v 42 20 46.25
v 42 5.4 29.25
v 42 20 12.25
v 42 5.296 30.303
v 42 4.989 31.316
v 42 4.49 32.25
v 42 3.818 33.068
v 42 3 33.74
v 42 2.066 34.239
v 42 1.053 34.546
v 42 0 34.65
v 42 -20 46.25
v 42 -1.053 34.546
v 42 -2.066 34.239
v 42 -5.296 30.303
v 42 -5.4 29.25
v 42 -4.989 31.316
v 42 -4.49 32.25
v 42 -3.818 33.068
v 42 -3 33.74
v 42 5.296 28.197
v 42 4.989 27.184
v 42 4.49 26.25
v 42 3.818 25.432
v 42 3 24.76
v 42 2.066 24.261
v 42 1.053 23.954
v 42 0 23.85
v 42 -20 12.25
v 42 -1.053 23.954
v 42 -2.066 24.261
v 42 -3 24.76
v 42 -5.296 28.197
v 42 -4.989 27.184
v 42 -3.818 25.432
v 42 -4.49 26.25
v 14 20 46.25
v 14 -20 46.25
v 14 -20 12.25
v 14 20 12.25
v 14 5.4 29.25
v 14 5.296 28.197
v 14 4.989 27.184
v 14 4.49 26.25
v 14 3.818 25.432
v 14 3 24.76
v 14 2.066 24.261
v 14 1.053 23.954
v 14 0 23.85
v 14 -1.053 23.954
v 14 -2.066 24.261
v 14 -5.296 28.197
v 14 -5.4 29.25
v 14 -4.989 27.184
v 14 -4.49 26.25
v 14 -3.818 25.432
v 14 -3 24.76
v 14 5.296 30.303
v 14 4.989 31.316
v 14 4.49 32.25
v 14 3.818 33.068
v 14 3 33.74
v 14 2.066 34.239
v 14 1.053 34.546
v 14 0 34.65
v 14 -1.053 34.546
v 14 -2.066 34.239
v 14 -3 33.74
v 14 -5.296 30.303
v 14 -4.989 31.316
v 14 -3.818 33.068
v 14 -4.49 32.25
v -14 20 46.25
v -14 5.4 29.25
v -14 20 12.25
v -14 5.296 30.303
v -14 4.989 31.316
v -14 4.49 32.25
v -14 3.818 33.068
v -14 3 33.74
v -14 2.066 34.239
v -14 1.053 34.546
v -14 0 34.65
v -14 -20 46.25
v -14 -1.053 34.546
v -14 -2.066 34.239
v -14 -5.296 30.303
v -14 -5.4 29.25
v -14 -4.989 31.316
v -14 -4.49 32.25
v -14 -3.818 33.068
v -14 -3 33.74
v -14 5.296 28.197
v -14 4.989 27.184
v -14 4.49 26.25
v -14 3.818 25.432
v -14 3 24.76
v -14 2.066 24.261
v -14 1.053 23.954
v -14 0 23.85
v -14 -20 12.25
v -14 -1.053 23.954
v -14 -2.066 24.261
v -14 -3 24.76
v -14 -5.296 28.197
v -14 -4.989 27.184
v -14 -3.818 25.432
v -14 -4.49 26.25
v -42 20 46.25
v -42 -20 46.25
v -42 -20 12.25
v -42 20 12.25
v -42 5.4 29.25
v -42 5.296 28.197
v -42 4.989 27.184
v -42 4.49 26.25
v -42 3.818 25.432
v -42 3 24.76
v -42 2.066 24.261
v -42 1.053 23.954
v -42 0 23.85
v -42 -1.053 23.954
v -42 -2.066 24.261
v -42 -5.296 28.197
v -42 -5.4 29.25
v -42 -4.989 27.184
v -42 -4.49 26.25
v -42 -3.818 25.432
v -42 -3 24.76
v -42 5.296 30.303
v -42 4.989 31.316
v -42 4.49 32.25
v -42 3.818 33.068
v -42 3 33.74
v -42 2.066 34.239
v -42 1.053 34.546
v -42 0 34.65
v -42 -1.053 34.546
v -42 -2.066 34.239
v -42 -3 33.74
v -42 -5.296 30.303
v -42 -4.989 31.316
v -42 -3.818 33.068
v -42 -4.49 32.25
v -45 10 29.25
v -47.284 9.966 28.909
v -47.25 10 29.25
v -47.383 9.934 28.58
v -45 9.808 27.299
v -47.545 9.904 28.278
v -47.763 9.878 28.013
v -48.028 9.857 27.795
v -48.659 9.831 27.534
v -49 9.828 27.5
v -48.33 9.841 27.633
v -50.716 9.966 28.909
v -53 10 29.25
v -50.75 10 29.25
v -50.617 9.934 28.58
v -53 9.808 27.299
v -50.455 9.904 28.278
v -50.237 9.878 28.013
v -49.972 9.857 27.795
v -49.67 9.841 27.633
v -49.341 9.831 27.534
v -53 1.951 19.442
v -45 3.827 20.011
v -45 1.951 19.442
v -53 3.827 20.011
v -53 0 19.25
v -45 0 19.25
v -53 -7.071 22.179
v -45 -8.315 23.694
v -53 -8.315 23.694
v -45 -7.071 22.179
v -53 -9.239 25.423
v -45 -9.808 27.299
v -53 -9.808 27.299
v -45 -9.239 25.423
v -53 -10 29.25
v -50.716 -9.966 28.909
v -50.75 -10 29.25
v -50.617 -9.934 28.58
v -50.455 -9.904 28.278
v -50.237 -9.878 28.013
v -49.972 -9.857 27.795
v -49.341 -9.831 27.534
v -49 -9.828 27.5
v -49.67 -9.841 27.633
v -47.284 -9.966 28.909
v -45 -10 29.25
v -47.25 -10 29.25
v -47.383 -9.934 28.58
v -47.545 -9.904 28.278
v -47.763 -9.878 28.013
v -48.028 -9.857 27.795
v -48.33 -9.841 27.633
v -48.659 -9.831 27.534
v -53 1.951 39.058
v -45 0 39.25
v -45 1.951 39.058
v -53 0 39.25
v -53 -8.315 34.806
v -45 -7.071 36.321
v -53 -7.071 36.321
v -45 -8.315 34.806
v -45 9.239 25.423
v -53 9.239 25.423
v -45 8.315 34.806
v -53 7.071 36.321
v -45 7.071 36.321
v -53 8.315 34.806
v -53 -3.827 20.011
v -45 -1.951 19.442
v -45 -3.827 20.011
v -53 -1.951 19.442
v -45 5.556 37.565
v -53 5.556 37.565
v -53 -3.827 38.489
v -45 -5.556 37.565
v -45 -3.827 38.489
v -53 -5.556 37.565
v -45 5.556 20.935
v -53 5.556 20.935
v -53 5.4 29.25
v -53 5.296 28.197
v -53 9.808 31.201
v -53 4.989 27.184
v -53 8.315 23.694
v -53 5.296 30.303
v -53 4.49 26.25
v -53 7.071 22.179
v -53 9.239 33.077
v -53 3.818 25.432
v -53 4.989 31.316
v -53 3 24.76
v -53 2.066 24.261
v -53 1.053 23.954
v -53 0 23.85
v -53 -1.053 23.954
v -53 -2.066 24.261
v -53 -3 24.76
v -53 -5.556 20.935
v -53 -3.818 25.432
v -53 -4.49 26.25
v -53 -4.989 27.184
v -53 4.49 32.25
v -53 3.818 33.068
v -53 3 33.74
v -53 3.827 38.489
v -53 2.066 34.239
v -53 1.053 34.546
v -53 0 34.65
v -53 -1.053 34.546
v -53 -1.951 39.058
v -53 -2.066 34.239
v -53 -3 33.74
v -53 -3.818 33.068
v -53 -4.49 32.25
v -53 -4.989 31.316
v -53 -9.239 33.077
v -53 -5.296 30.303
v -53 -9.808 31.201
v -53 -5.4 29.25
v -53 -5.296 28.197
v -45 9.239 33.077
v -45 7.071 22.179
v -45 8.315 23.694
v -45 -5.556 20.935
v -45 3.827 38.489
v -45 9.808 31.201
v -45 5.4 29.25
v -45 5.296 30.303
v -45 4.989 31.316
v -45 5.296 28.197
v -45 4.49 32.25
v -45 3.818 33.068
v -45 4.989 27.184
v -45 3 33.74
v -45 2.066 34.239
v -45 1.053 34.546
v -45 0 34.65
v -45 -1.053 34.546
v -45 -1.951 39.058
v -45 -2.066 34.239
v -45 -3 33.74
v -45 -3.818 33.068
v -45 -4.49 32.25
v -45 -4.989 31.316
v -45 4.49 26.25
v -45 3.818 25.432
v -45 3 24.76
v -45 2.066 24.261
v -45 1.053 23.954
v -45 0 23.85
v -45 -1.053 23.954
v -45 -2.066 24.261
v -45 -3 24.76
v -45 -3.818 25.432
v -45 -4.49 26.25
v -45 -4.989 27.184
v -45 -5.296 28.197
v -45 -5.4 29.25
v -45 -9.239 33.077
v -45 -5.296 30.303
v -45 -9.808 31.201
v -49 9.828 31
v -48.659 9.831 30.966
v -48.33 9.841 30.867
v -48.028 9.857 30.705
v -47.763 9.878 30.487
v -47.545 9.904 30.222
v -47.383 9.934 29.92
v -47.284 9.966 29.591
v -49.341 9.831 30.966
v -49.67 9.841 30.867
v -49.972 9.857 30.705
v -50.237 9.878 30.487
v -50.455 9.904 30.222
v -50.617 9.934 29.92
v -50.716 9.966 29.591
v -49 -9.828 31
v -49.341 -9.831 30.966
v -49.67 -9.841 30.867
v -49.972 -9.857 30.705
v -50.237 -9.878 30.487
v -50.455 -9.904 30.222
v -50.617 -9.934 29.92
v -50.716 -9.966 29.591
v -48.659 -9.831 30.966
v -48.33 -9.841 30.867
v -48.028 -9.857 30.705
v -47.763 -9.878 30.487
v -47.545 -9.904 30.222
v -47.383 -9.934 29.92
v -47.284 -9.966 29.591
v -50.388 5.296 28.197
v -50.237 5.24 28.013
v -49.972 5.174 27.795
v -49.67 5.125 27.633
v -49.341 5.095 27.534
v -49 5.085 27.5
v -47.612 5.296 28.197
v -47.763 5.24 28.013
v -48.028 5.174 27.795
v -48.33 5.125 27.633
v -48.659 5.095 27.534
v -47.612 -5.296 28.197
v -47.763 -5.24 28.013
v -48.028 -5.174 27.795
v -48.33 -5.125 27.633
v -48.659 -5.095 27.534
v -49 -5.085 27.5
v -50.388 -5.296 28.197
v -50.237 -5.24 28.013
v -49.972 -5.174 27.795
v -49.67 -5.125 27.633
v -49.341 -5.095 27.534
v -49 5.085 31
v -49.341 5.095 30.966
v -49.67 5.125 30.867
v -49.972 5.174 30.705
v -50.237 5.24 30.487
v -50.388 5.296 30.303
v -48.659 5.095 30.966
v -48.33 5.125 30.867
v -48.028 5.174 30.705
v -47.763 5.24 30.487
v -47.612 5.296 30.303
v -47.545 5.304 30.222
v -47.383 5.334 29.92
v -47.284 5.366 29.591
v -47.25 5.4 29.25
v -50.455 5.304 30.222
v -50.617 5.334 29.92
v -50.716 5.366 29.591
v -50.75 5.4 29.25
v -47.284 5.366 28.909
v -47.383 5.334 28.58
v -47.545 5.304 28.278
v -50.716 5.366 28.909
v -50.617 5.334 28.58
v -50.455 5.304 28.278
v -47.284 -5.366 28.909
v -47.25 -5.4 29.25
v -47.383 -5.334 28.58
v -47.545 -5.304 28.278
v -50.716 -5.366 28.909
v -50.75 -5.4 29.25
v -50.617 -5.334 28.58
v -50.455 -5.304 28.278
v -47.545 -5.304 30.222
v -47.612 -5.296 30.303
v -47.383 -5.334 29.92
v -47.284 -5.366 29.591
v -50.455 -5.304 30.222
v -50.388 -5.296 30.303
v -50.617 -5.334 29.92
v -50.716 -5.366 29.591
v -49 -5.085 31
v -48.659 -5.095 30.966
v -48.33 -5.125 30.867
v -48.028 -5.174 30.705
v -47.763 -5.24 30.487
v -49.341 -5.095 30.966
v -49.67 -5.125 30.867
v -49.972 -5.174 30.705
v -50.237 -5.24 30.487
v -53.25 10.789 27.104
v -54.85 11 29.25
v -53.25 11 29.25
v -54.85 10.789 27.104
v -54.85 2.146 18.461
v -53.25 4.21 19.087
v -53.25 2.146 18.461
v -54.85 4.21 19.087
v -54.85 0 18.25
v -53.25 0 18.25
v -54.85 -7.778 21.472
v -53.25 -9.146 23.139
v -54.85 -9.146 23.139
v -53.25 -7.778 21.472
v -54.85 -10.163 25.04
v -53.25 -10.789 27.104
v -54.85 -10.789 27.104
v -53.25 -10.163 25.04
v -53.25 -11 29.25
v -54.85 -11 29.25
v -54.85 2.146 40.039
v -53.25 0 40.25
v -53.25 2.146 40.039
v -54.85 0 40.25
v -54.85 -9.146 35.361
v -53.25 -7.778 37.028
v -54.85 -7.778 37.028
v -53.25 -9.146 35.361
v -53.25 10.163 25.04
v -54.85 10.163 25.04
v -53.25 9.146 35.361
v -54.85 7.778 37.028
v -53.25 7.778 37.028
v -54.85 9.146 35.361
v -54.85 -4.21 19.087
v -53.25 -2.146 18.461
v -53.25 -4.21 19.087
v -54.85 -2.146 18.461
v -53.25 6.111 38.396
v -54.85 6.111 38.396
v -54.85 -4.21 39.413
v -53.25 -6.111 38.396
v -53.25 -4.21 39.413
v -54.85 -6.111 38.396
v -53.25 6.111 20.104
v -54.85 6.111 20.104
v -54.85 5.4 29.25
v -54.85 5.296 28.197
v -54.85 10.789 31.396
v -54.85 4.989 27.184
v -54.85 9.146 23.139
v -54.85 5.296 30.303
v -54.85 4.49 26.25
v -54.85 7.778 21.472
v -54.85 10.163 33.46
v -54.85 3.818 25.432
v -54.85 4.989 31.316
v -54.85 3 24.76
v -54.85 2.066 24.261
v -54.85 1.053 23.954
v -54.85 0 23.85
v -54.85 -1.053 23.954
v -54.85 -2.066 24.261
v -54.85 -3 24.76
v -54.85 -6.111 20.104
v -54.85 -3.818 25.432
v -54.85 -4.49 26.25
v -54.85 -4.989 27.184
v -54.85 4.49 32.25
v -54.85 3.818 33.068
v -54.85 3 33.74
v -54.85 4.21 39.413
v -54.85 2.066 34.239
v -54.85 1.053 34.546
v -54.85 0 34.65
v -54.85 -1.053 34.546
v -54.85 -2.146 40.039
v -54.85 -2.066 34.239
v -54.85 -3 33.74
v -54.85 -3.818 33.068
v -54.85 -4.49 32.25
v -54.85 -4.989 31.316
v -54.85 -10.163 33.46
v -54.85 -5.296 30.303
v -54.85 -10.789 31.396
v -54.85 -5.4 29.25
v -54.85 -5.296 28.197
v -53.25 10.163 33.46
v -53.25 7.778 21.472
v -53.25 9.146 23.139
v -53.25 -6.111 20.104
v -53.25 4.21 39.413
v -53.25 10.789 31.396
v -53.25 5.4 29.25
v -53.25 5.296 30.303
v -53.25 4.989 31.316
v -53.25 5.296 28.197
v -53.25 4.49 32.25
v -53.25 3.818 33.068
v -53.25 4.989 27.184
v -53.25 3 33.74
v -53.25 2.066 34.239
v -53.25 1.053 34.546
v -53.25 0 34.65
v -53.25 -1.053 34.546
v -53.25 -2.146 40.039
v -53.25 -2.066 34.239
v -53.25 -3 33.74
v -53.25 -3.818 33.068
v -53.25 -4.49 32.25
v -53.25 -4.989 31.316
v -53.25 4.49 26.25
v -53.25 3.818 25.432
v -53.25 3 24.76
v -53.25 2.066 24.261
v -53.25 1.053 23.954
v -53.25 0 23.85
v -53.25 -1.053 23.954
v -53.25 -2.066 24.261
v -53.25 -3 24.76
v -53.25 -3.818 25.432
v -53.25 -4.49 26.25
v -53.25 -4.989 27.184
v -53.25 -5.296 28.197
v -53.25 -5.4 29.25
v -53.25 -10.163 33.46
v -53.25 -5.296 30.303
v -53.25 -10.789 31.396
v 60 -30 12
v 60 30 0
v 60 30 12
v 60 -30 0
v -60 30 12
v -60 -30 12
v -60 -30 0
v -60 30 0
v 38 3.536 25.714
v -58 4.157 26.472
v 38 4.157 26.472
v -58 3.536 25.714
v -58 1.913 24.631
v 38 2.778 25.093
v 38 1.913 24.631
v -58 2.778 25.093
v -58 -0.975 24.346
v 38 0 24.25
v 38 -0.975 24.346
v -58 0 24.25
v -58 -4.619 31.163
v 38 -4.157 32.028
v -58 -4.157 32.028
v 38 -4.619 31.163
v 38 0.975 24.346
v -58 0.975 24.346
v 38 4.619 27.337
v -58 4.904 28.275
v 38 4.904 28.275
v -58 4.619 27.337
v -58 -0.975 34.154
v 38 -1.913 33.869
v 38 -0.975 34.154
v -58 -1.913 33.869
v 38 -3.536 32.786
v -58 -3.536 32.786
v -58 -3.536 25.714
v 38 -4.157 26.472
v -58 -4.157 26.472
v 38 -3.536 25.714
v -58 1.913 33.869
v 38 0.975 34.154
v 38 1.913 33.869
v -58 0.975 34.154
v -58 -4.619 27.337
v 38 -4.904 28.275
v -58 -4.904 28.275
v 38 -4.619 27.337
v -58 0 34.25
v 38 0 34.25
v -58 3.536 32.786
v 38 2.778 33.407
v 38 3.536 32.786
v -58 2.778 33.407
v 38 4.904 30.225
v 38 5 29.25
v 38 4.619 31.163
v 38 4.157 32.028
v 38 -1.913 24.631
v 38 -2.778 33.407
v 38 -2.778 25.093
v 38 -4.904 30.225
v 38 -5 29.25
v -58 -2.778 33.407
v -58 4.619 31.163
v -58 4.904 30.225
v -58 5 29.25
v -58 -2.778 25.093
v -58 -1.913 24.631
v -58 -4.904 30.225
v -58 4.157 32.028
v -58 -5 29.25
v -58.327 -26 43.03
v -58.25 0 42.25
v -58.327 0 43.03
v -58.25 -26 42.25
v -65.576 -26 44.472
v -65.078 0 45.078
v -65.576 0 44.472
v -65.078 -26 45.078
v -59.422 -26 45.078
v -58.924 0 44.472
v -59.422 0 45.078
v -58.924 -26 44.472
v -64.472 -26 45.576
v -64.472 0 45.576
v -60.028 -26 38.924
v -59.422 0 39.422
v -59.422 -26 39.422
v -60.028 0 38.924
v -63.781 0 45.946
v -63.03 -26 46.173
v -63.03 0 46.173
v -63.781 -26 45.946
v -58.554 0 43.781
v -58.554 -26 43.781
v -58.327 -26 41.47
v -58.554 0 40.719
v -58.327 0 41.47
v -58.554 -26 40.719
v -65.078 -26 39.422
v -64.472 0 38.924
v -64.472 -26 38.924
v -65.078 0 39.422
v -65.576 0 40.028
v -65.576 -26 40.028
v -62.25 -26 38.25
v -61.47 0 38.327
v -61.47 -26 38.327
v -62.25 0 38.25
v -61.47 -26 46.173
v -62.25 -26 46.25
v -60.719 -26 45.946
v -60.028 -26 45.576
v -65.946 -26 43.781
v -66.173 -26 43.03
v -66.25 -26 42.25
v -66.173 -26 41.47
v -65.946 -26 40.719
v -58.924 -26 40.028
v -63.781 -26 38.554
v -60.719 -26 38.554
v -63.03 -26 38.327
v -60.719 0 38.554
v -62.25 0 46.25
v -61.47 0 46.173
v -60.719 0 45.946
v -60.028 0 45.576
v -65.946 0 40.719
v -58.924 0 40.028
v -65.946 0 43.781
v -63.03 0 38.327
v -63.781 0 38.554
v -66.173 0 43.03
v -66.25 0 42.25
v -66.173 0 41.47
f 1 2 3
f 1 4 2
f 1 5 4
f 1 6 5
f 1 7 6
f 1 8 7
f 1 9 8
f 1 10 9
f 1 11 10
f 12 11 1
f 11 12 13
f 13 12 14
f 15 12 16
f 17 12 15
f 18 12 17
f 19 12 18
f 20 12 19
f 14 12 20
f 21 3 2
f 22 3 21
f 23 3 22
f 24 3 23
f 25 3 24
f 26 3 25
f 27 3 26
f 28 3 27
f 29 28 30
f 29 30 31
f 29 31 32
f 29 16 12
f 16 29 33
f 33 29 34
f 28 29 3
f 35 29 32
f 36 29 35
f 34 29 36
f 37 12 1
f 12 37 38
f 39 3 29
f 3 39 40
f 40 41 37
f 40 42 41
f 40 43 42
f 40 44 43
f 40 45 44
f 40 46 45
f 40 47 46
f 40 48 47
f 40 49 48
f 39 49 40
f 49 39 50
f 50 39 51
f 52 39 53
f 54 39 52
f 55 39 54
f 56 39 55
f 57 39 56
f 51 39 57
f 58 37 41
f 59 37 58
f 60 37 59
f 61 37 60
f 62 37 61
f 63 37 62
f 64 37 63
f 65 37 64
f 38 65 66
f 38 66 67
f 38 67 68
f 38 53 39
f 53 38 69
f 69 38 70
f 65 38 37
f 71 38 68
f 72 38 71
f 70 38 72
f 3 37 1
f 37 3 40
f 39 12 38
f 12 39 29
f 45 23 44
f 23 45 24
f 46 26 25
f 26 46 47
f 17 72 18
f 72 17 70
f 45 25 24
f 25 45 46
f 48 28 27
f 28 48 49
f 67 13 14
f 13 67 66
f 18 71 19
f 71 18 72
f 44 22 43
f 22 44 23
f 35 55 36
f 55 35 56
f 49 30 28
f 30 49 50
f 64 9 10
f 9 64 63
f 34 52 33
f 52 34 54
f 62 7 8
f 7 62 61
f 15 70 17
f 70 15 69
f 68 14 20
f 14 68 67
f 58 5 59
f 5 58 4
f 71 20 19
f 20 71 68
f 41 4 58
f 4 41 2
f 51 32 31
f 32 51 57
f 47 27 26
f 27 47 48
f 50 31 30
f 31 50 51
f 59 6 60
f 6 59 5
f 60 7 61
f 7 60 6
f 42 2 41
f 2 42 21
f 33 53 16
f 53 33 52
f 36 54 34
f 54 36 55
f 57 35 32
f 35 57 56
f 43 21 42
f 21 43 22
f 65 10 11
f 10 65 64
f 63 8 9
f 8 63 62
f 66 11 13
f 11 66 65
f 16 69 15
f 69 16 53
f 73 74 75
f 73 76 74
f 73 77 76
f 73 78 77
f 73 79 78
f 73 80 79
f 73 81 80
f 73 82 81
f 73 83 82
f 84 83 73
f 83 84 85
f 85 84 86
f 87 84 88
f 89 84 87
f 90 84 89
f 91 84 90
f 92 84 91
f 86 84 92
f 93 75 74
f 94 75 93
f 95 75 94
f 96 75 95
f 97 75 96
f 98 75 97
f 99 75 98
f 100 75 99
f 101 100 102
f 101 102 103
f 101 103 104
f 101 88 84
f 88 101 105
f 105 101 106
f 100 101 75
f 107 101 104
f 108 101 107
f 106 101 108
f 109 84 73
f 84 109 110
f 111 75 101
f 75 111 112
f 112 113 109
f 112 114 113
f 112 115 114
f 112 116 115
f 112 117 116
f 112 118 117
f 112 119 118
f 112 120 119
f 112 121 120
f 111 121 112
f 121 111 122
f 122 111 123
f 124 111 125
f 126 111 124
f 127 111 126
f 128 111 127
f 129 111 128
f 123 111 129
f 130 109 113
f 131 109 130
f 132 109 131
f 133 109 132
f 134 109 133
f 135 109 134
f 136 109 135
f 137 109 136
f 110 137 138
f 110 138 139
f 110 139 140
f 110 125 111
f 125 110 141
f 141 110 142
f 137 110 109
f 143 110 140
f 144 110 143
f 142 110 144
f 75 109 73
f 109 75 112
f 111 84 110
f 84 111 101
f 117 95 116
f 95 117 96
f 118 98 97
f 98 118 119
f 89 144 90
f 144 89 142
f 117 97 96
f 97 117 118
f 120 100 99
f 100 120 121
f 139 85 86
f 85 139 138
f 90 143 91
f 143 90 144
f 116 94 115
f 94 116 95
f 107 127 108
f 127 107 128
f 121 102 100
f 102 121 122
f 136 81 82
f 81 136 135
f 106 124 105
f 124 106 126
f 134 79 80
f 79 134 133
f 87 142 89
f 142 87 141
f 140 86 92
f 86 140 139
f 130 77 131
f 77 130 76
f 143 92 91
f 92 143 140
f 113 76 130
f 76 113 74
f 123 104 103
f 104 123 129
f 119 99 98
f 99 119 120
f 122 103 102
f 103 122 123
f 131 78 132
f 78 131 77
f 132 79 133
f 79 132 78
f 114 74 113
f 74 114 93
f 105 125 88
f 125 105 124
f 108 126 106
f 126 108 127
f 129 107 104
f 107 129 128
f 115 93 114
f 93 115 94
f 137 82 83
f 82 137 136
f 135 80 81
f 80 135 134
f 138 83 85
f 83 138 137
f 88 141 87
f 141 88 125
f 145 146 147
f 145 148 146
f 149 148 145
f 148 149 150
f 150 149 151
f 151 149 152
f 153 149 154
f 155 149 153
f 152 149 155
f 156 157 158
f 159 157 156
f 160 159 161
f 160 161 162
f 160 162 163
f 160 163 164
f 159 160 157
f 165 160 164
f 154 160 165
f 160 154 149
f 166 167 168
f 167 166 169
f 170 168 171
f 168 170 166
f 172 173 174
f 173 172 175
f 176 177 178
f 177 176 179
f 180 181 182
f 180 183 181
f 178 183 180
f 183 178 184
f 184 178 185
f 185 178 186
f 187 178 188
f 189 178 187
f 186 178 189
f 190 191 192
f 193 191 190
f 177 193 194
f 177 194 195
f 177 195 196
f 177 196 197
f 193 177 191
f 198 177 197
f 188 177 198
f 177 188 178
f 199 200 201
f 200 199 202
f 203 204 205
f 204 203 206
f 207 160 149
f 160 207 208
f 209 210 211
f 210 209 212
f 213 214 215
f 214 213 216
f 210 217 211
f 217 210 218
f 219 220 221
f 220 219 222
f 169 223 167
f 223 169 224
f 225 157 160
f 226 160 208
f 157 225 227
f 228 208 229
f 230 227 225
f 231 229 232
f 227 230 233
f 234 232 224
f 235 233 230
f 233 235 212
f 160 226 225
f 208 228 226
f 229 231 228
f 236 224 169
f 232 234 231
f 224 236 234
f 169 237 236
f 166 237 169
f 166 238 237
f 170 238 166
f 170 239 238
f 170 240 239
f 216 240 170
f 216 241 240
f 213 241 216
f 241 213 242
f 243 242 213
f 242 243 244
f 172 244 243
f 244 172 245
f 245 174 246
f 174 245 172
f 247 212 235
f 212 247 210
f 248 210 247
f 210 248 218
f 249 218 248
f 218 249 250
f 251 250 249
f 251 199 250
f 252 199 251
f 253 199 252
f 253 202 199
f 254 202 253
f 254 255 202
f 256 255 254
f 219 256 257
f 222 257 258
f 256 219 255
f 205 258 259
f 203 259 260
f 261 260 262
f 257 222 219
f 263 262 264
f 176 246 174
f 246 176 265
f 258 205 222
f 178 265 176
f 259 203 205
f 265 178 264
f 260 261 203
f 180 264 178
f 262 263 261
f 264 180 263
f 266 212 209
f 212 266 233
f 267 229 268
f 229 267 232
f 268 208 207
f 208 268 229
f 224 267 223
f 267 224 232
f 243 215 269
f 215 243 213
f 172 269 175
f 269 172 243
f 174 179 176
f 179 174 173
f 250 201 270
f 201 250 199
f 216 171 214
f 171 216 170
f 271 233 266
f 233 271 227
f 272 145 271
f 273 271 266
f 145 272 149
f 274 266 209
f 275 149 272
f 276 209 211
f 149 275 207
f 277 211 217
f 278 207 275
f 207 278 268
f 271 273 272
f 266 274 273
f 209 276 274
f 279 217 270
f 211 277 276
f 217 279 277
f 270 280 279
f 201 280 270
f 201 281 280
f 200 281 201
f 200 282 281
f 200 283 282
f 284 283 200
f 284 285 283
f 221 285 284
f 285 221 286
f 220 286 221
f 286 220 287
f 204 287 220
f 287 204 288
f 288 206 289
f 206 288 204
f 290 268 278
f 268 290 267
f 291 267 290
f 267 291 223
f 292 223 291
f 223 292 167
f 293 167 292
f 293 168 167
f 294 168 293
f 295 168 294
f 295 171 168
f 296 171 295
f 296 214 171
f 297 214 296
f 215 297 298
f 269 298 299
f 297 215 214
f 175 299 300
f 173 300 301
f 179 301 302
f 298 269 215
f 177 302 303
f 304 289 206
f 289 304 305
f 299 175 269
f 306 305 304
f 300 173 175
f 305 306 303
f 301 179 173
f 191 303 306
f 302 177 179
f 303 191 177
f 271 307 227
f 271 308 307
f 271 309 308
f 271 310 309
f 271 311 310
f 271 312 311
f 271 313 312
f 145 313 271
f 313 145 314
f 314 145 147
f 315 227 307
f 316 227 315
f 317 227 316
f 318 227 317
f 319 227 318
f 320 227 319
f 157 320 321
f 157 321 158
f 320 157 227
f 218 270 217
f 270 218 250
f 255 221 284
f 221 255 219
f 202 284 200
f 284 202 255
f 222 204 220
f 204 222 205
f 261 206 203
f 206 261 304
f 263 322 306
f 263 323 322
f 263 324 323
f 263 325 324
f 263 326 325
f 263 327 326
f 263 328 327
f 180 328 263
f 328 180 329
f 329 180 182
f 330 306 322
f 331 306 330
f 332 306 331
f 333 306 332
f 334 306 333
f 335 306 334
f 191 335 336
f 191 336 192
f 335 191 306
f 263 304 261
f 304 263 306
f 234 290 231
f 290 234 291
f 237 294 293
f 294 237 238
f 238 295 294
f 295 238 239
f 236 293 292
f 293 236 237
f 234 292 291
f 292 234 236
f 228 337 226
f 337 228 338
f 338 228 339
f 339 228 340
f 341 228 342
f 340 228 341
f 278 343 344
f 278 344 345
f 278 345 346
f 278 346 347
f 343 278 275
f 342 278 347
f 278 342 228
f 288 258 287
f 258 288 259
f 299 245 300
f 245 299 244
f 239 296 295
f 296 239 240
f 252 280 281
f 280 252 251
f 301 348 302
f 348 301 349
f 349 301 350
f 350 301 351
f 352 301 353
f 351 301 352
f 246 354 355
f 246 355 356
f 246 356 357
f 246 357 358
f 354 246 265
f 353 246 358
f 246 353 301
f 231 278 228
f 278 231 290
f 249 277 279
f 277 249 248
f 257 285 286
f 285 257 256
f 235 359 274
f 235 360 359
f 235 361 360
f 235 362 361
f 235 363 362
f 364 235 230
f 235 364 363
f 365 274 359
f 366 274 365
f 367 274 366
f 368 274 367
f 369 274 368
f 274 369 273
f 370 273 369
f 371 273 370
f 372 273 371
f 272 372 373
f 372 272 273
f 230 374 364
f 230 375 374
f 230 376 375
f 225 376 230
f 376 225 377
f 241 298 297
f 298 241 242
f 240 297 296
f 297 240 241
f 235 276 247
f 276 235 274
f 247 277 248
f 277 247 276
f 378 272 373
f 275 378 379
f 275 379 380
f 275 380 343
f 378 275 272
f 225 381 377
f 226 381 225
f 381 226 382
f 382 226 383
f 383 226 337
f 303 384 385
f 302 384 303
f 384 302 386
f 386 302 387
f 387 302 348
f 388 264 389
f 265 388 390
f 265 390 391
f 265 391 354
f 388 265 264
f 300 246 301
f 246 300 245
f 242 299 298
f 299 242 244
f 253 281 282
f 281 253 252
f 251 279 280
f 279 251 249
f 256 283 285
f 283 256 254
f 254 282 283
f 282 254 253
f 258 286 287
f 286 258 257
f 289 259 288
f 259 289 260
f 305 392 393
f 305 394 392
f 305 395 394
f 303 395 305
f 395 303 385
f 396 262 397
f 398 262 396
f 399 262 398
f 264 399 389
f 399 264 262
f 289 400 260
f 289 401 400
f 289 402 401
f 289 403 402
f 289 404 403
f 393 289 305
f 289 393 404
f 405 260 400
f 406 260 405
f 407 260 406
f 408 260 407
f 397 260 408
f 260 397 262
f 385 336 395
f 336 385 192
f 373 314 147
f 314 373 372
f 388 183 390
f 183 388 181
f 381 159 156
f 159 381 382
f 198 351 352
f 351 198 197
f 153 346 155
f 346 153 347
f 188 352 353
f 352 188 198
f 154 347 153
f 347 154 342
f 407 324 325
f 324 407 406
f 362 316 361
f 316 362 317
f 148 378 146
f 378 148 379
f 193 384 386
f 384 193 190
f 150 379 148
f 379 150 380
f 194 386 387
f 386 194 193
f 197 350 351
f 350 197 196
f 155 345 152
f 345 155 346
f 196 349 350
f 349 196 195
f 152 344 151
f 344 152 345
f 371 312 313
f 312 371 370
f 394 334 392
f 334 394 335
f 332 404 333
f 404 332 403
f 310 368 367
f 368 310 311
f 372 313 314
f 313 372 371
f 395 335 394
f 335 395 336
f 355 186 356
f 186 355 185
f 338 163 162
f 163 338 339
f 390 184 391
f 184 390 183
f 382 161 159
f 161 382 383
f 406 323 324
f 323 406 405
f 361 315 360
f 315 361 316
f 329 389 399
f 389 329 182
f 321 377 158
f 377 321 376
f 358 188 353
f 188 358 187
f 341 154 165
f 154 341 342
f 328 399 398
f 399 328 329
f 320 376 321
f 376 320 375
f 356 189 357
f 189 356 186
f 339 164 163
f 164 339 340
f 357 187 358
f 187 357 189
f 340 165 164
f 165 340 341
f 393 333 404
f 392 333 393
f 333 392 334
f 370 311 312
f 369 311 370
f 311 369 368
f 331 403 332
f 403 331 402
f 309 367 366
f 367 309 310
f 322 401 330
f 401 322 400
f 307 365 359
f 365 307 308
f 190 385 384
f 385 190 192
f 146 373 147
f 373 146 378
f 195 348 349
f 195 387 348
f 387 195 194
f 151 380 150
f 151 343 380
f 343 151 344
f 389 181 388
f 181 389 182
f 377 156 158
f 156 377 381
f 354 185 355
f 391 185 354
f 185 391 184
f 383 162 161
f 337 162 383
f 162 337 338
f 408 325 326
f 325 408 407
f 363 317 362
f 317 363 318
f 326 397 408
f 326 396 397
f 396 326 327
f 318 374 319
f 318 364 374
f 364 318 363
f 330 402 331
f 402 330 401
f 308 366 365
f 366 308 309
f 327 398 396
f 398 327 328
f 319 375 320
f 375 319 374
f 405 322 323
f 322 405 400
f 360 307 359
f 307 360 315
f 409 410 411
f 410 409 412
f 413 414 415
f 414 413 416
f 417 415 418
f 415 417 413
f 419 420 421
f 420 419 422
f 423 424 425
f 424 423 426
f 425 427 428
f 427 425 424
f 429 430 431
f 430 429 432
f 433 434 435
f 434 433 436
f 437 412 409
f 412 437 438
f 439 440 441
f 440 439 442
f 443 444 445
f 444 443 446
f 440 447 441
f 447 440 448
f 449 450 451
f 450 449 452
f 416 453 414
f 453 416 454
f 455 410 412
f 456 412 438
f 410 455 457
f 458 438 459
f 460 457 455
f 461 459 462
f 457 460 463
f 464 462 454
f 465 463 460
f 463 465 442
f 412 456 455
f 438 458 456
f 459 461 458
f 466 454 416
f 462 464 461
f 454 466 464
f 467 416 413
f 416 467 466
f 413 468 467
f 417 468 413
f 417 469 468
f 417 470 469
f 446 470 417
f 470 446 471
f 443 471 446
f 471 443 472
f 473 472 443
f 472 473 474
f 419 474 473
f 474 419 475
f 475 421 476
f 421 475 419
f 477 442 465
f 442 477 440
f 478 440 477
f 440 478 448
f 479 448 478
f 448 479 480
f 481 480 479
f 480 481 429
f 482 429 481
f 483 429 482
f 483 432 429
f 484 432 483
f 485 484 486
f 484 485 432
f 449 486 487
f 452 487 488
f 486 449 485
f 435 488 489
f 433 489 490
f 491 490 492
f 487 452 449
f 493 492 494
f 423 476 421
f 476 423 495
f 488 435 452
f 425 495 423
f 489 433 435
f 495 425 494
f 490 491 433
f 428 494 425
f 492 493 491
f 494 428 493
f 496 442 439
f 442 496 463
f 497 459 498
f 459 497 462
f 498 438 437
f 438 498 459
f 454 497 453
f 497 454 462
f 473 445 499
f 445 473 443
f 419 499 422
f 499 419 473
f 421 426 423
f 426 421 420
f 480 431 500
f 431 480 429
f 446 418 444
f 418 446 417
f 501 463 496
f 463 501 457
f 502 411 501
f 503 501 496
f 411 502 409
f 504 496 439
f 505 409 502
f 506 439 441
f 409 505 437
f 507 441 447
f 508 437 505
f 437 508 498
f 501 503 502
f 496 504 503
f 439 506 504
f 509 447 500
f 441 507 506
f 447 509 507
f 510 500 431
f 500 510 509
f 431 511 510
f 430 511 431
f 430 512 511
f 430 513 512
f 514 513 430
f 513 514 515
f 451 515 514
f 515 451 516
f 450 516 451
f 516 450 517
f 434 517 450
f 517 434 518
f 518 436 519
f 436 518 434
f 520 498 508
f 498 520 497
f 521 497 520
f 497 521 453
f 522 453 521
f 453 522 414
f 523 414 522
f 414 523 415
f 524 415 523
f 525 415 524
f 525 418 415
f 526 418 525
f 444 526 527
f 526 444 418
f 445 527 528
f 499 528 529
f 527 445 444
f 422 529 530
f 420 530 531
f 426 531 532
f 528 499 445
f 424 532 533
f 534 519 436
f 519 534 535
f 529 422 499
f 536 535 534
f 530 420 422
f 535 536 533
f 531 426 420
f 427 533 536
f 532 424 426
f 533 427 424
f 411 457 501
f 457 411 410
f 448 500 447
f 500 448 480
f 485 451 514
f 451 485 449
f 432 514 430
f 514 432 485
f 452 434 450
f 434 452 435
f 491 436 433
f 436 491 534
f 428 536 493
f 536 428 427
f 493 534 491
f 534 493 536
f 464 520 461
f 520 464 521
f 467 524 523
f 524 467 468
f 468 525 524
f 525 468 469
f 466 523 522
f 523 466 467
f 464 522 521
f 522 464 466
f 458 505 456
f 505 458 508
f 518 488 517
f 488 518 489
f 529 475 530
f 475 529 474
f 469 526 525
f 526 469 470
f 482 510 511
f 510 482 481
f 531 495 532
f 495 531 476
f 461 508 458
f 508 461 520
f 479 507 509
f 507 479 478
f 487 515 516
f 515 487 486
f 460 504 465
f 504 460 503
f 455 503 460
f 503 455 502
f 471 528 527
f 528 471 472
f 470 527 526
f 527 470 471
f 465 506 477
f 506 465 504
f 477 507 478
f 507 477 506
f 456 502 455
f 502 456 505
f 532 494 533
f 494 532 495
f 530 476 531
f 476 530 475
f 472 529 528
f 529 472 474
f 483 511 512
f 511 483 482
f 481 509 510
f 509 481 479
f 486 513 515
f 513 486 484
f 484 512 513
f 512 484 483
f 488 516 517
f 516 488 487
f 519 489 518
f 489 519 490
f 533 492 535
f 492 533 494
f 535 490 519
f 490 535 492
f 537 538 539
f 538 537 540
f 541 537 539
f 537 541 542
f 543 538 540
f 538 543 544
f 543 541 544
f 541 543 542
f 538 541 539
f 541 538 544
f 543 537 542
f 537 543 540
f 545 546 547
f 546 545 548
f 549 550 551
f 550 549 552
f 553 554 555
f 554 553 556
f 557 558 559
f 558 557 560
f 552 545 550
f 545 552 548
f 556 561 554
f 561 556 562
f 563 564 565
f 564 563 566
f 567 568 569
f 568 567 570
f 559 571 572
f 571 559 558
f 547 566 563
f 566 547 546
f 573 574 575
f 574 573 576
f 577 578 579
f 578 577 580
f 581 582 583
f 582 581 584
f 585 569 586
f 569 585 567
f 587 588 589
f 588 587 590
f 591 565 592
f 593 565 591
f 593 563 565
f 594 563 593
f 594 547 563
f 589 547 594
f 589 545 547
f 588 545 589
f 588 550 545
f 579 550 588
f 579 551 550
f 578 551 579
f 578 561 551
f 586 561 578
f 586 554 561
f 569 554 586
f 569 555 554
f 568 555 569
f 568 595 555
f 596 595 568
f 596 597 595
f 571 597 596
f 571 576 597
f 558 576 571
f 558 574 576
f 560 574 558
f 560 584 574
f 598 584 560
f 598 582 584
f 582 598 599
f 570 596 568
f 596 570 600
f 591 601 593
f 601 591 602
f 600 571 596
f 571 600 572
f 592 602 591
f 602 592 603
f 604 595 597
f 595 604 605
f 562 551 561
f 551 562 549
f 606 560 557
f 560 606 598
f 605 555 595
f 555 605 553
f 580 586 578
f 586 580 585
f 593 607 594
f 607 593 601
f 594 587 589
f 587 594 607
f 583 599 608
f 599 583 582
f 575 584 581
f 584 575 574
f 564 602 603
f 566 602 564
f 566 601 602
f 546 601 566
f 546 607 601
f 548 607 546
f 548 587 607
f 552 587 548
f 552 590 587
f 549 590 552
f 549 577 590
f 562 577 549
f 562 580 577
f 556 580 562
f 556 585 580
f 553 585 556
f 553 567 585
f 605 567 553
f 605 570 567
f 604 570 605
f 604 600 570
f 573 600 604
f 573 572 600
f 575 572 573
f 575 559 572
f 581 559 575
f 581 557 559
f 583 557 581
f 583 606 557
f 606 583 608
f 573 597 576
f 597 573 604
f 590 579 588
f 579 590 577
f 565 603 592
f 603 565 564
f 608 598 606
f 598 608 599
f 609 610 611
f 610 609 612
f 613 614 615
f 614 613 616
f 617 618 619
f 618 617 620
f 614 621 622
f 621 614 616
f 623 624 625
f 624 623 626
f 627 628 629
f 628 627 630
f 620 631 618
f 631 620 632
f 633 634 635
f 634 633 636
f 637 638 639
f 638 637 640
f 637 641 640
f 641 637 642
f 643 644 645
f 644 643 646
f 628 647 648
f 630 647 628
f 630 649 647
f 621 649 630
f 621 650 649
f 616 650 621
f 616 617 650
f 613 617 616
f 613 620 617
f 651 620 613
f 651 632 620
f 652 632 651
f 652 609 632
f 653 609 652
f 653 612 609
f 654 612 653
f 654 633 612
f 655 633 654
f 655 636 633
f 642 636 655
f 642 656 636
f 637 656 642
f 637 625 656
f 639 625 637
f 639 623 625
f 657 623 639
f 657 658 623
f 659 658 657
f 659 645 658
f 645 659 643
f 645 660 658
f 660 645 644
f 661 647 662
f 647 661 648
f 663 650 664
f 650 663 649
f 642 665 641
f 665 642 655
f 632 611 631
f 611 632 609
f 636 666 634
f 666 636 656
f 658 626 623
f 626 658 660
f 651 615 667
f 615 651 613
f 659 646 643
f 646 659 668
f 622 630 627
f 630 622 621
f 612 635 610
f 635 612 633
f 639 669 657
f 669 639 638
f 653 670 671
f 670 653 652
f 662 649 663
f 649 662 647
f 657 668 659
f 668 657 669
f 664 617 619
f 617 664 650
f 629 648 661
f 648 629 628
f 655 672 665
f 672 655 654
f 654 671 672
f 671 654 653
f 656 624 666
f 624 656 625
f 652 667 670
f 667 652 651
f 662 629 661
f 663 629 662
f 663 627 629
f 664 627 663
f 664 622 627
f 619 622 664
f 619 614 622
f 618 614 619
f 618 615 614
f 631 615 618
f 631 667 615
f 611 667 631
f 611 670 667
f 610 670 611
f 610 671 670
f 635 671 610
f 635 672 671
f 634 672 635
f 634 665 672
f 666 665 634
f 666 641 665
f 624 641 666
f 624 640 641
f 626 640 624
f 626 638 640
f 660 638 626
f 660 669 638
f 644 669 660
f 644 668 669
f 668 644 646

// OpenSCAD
$fn = 32;

// ------------------------------------------------------------------------
// Machine vise: screw d10, jaws 28 x 34 mm
// Every part is its own module, assembly() places every instance.
// ------------------------------------------------------------------------

// --- part 1 ---
module vise_bed() {
  difference() {
    translate([-60, -30, 0]) cube([120, 60, 12]);
  }
}

// --- part 2 ---
module vise_jaw() {
  difference() {
    translate([-14, -20, 0]) cube([28, 40, 34]);
    translate([0, 0, 17]) rotate([0, 90, 0]) cylinder(h = 30, d = 10.8, center = true);
  }
}

// --- part 3 ---
module vise_screw() {
  translate([0, 0, -48]) cylinder(h = 96, d = 10);
}

// --- part 4 ---
module screw_collar() {
  difference() {
    cylinder(h = 8, d = 20);
    translate([0, 0, -1]) cylinder(h = 10, d = 10.8);
    translate([0, 0, 4]) rotate([90, 0, 0]) cylinder(h = 22, d = 3.5, center = true);
  }
}

// --- part 5 ---
module screw_washer() {
  difference() {
      translate([0, 0, 0]) cylinder(h = 1.6, d = 22);
      translate([0, 0, -1]) cylinder(h = 3.6, d = 10.8);
    }
}

// --- part 6 ---
module vise_handle() {
  cylinder(h = 26, d = 8);
}

// --- assembly ---
module assembly() {
  color([0.80, 0.24, 0.20]) translate([0, 0, 0]) rotate([0, 0, 0]) vise_bed();
  color([0.20, 0.45, 0.75]) translate([28, 0, 12.25]) rotate([0, 0, 0]) vise_jaw();
  color([0.25, 0.62, 0.32]) translate([-28, 0, 12.25]) rotate([0, 0, 0]) vise_jaw();
  color([0.92, 0.70, 0.18]) translate([-10, 0, 29.25]) rotate([0, 90, 0]) vise_screw();
  color([0.58, 0.35, 0.70]) translate([-53, 0, 29.25]) rotate([0, 90, 0]) screw_collar();
  color([0.16, 0.66, 0.66]) translate([-54.85, 0, 29.25]) rotate([0, 90, 0]) screw_washer();
  color([0.85, 0.48, 0.18]) translate([-62.25, 0, 42.25]) rotate([90, 0, 0]) vise_handle();
}

assembly();
